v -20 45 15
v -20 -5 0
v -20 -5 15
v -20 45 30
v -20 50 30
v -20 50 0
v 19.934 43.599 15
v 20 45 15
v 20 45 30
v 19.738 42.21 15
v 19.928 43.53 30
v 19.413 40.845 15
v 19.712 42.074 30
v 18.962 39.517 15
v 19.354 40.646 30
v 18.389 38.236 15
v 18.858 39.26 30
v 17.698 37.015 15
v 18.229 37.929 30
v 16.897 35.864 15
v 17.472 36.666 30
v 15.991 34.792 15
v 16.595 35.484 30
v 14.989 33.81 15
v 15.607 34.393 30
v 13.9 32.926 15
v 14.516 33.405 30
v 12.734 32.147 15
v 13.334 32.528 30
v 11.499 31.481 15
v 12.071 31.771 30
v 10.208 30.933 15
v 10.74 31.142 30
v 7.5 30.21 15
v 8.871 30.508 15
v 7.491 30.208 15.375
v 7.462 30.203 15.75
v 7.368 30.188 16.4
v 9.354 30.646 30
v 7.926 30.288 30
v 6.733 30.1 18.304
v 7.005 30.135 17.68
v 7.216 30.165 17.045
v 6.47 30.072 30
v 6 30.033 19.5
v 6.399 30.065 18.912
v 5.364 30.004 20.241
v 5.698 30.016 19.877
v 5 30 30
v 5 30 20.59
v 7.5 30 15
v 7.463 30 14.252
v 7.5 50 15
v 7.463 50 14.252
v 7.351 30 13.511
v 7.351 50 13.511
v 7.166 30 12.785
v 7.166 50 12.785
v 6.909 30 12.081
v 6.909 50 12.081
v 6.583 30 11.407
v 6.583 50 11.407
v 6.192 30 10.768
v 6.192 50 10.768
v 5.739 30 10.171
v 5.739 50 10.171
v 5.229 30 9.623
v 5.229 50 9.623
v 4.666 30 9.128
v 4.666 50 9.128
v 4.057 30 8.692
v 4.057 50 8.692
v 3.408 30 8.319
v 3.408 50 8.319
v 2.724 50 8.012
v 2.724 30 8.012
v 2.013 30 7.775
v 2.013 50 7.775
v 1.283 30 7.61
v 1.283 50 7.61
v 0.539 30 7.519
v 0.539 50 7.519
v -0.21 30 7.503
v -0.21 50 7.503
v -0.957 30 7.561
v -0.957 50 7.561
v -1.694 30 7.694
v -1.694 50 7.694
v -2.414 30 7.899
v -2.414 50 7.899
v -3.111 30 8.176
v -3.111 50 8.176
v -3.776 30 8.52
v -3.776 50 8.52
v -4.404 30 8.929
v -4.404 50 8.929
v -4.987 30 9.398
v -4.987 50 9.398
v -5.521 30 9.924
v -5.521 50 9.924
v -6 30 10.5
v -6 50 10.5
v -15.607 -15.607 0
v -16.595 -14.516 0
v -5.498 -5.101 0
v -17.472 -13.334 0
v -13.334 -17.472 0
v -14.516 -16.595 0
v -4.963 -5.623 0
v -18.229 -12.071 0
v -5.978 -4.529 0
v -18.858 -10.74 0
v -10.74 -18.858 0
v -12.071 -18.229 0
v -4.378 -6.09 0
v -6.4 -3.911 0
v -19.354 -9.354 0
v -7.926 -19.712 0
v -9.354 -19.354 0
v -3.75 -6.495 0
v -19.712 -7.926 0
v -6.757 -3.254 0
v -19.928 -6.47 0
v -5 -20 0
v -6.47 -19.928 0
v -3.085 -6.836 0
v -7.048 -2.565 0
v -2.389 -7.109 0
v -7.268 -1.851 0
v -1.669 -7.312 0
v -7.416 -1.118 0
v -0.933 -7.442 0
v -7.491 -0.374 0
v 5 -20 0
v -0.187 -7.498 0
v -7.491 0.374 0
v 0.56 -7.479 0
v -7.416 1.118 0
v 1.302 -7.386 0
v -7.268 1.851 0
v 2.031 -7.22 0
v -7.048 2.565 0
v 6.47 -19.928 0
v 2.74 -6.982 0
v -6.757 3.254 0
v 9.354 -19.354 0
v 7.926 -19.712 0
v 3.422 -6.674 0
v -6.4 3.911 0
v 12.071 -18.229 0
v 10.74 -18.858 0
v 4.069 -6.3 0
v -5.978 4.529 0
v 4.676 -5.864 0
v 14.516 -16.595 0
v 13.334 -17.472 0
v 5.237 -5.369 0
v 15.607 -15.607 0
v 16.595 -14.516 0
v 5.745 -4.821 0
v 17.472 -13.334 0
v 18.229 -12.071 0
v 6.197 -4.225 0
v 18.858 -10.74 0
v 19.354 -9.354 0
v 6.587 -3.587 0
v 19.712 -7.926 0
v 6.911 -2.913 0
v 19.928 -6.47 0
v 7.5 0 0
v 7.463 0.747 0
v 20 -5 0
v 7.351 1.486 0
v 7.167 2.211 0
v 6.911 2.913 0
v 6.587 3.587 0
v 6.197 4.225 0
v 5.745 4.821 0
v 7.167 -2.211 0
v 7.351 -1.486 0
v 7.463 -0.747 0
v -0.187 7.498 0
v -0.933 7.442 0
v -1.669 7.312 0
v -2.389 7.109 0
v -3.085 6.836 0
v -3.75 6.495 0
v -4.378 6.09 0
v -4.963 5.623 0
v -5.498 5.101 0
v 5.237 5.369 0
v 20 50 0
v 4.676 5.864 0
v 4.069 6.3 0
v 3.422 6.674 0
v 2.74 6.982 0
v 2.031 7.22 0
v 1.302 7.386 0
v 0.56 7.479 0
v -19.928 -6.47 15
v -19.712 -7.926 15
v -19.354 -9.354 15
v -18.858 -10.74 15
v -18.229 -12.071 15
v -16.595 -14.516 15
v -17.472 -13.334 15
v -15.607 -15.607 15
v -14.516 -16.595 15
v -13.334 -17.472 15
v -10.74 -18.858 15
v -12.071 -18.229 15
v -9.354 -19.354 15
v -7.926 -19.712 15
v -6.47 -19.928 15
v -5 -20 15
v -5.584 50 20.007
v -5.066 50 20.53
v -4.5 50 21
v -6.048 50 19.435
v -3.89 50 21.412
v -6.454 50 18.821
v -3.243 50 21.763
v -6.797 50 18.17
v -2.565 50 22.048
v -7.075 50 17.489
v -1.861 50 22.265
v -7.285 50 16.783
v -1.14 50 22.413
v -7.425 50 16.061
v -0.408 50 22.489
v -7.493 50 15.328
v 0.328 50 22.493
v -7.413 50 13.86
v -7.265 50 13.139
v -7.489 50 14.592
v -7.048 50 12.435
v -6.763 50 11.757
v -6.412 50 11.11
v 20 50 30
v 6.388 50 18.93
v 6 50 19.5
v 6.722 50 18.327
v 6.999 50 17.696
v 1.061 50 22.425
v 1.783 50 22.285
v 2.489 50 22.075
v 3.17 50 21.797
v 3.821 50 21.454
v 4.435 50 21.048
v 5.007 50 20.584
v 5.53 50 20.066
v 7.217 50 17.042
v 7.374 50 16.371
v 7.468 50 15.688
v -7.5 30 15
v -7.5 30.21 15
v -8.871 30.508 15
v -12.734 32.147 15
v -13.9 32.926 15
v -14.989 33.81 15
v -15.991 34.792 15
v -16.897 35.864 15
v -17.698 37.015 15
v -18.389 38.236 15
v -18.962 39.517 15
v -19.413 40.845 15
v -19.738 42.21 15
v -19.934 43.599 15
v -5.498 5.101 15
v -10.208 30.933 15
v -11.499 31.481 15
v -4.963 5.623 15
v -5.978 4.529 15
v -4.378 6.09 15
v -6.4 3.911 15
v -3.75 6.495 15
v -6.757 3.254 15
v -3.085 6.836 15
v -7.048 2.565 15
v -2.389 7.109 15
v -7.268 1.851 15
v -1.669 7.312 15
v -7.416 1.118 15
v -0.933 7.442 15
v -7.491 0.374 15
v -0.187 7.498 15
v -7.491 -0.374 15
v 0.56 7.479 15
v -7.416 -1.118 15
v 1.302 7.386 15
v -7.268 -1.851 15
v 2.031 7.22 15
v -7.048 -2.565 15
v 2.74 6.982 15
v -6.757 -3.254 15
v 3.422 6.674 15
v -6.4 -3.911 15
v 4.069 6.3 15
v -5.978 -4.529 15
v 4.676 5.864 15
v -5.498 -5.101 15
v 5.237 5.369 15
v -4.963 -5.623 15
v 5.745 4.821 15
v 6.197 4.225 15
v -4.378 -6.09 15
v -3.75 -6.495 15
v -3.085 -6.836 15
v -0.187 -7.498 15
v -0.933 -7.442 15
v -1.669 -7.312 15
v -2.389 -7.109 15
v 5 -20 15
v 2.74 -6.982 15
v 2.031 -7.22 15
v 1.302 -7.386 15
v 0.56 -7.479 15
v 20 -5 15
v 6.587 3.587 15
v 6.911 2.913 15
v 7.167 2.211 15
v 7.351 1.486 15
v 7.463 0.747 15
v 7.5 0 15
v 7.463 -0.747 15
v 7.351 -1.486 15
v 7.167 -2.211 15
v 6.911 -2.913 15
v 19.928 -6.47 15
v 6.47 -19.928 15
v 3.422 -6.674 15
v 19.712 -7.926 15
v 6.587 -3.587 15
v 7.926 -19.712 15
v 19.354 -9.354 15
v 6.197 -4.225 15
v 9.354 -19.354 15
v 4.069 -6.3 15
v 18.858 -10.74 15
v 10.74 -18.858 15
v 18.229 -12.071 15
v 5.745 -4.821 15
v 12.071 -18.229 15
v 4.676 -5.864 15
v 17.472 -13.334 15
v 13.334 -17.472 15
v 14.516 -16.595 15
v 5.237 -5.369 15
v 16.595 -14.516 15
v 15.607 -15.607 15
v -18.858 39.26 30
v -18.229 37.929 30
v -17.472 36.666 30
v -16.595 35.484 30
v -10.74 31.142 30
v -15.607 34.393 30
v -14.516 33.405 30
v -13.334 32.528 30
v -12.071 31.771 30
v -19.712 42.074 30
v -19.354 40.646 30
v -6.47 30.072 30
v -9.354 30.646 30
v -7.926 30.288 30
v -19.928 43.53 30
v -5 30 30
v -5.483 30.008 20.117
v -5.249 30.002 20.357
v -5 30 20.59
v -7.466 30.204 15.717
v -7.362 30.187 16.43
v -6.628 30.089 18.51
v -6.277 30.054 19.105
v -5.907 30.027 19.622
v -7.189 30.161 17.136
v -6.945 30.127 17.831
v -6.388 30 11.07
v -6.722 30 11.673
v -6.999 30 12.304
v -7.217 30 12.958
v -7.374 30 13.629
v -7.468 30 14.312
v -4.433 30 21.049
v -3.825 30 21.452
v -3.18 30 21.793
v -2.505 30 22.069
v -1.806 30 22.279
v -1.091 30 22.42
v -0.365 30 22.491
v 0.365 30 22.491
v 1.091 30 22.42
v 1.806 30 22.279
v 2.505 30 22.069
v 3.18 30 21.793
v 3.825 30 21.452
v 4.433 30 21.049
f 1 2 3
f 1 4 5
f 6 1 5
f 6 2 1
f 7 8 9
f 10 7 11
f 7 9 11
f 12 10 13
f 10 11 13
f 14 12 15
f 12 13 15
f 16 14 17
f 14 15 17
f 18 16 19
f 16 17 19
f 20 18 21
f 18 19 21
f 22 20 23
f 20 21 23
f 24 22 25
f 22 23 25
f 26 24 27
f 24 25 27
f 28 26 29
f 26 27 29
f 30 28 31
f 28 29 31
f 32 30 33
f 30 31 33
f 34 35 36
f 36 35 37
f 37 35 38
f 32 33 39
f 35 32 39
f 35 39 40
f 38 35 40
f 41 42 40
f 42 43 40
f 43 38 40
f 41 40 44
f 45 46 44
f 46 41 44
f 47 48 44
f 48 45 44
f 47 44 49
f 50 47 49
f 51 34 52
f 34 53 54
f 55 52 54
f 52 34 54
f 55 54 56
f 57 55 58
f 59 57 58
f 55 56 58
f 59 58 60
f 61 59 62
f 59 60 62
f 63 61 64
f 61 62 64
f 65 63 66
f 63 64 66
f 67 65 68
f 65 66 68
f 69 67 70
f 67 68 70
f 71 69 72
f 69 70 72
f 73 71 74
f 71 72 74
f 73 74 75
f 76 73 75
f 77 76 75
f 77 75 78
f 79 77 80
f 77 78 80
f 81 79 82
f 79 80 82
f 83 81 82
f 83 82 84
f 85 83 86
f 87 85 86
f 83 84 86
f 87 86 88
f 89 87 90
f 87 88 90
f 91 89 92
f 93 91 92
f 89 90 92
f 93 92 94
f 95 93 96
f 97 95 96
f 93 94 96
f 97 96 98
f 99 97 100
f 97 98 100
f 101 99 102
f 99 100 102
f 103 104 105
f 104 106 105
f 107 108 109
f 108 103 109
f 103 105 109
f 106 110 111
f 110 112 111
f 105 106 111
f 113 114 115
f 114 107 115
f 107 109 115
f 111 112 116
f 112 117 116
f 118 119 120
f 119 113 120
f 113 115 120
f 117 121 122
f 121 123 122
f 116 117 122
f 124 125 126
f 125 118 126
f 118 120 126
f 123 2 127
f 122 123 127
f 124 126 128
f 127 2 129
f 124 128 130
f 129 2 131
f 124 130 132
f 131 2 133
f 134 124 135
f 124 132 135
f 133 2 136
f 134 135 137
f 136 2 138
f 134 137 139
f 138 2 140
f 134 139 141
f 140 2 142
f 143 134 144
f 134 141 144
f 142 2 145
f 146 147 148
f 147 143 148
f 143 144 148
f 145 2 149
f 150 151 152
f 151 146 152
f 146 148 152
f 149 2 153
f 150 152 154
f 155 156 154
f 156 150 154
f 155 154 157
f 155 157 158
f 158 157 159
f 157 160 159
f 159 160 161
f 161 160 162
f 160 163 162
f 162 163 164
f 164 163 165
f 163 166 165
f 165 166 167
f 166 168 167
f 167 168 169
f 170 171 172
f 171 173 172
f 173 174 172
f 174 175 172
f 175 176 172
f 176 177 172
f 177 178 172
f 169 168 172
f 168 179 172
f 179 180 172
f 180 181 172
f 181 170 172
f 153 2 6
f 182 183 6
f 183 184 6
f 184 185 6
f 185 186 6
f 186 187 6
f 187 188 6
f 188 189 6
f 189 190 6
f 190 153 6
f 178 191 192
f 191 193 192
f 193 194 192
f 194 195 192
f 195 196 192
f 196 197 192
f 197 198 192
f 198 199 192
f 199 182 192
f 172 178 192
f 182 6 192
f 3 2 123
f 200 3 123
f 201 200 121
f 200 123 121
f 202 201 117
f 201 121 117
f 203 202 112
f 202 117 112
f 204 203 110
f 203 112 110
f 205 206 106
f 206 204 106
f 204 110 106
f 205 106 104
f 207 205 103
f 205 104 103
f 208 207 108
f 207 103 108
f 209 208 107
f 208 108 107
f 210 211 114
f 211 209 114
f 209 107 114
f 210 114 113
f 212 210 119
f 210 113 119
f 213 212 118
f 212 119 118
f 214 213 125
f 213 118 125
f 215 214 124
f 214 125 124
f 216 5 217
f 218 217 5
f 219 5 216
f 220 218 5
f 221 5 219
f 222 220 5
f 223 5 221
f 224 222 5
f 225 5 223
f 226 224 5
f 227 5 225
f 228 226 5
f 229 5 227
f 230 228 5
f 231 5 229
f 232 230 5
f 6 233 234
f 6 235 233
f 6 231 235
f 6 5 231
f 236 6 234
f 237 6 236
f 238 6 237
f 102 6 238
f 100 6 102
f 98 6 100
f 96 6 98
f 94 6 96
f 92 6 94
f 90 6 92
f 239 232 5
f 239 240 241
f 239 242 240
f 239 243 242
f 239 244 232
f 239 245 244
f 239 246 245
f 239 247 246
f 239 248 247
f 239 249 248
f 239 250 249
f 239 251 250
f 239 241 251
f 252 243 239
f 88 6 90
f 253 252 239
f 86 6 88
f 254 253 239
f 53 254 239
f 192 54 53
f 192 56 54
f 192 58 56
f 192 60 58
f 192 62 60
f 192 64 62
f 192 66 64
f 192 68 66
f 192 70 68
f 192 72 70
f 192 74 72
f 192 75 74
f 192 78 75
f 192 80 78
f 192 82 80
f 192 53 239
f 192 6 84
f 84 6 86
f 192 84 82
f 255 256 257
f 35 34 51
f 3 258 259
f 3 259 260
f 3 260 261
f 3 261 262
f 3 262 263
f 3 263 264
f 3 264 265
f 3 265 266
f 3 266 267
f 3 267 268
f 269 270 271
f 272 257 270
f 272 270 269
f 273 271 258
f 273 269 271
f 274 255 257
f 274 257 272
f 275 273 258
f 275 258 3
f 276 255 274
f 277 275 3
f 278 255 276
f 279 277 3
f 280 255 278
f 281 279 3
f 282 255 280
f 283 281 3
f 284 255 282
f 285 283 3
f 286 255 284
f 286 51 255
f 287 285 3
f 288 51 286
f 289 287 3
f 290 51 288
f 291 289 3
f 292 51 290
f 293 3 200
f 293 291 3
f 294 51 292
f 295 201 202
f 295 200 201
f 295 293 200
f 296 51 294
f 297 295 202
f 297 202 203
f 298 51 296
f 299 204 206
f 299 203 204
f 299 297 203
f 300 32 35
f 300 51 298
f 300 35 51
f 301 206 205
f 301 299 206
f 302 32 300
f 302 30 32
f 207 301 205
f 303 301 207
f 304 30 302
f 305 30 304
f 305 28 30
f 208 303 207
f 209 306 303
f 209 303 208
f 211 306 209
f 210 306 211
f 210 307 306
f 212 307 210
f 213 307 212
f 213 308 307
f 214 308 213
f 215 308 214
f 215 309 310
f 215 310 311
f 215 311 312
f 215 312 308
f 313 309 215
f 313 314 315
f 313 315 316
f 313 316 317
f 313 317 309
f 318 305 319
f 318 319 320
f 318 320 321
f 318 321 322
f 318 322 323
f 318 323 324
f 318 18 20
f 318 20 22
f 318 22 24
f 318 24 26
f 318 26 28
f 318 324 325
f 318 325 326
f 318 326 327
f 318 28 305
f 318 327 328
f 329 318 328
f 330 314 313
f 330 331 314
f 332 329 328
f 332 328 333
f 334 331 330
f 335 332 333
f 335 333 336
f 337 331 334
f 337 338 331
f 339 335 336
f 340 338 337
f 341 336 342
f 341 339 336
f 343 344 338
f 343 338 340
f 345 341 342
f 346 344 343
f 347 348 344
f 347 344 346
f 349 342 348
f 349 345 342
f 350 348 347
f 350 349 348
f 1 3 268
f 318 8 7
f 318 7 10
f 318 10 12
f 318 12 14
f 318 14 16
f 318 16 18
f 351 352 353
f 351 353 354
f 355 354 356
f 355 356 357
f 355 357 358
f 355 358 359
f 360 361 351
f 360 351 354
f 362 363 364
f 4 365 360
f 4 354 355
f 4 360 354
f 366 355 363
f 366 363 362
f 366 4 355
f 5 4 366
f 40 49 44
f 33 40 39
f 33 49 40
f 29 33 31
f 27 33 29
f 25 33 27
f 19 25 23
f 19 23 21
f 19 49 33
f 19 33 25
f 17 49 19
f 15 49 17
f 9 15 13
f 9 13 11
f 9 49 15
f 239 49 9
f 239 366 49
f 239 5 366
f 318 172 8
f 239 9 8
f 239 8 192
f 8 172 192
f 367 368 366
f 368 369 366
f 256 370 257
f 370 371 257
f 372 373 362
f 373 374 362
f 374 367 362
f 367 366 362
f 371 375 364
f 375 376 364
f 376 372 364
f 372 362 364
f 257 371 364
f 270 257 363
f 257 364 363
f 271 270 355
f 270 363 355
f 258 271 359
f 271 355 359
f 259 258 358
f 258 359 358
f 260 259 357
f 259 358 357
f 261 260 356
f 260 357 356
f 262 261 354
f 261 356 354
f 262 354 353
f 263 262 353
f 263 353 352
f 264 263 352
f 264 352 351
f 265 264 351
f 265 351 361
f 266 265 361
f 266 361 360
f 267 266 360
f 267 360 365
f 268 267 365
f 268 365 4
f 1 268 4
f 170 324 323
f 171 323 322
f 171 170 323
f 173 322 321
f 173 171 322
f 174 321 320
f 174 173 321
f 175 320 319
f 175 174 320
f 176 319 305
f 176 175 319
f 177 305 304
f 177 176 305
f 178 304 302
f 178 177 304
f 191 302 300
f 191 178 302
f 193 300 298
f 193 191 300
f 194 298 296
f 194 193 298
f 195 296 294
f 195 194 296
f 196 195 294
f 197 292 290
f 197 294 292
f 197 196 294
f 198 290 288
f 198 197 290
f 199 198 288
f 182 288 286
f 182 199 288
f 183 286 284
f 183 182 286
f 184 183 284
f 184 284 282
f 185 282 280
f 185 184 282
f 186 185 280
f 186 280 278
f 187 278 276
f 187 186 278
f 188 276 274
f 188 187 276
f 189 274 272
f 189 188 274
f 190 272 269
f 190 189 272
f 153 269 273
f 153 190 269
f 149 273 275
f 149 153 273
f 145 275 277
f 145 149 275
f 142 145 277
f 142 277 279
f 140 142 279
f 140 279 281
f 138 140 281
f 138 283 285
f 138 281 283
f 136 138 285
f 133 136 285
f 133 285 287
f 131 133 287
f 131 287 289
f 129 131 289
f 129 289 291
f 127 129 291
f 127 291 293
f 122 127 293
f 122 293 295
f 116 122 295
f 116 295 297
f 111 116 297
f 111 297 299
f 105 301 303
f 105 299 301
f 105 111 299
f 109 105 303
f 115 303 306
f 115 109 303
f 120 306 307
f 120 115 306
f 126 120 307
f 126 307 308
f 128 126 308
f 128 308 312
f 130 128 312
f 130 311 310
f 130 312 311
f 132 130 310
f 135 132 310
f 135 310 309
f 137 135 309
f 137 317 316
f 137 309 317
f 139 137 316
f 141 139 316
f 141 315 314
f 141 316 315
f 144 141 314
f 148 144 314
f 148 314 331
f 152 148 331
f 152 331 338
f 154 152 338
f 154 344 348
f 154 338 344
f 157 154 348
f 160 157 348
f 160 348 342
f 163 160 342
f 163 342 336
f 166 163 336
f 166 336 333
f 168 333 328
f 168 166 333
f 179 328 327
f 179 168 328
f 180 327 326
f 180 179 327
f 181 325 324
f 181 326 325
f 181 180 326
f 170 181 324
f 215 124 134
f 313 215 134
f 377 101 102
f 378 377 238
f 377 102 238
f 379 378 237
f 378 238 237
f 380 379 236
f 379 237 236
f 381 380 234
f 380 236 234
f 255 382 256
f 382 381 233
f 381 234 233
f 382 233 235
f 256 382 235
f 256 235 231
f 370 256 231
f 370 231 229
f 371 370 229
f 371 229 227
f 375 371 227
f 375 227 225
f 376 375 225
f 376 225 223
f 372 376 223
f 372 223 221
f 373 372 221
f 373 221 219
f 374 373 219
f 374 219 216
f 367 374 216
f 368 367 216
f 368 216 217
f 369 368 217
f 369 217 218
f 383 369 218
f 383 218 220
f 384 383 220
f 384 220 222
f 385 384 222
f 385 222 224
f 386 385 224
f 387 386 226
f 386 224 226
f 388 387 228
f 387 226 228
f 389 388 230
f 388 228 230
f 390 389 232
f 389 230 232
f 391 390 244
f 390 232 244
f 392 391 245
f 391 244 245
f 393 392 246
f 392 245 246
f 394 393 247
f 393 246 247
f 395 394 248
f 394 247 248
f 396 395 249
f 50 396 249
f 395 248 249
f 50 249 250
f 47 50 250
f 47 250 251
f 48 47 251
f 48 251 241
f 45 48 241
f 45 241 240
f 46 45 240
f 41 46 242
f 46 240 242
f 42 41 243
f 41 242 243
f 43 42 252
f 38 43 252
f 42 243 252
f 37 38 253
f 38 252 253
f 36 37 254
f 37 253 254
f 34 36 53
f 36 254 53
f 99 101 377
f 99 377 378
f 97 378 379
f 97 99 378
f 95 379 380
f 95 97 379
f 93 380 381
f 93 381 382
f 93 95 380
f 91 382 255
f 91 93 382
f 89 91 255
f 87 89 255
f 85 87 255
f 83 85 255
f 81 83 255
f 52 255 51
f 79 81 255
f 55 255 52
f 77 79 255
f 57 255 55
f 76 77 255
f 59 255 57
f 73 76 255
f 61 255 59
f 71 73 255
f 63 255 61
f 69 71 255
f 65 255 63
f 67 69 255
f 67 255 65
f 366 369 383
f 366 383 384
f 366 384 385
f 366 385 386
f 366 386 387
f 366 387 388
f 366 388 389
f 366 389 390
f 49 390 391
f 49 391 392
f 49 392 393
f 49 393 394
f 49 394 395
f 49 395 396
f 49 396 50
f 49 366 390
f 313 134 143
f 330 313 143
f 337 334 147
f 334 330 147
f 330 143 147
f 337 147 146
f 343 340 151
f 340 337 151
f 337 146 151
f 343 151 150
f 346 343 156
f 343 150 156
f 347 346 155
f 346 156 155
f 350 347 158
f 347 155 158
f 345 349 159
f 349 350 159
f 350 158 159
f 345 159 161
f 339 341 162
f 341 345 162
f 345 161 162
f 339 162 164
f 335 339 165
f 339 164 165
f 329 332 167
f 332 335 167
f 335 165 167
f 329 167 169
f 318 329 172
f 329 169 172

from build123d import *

# Parameters (mm, degrees)
SKETCH1_W           = 40
SKETCH1_H           = 70
SKETCH1_R           = 7.5
BOSS_EXTRUDE1_DEPTH = 30
CUT_EXTRUDE1_DEPTH  = 20
SKETCH3_W           = 40
SKETCH3_H           = 50
CUT_EXTRUDE2_DEPTH  = 15
FILLET1_R           = 15


with BuildPart() as part:
    # Sketch1 → Boss-Extrude1 (new body)
    with BuildSketch(Plane.XY):
        with Locations((0, 15)):
            Rectangle(SKETCH1_W, SKETCH1_H)
        Circle(SKETCH1_R, mode=Mode.SUBTRACT)
    extrude(amount=BOSS_EXTRUDE1_DEPTH)

    # Sketch2 → Cut-Extrude1 (cut)
    with BuildSketch(Plane(origin=(0, 50, 0), x_dir=(1, 0, 0), z_dir=(0, 1, 0))):
        with BuildLine():
            ThreePointArc((7.5, -15), (2.371708245, -7.884875265), (-6, -10.5))
            Line((-6, -10.5), (6, -19.5))
            ThreePointArc((6, -19.5), (7.115124735, -17.371708245), (7.5, -15))
        make_face()
        with BuildLine():
            Line((6, -19.5), (-6, -10.5))
            ThreePointArc((-6, -10.5), (-4.5, -21), (6, -19.5))
        make_face()
    extrude(amount=-CUT_EXTRUDE1_DEPTH, mode=Mode.SUBTRACT)

    # Sketch3 → Cut-Extrude2 (cut)
    with BuildSketch(Plane.XY.offset(30)):
        with Locations((0, 5)):
            Rectangle(SKETCH3_W, SKETCH3_H)
    extrude(amount=-CUT_EXTRUDE2_DEPTH, mode=Mode.SUBTRACT)

    # Fillet1
    # the kernel refuses this fillet: 15 mm, written as the material it takes off along each edge
    with BuildSketch(Plane(origin=(20, -20, -37.5), x_dir=(0, 1, 0), z_dir=(0, 0, 1))) as fillet1_piece_1:
        with BuildLine():
            CenterArc((FILLET1_R, FILLET1_R), FILLET1_R, 180, 90)
            Line((0, FILLET1_R), (0, 0))
            Line((0, 0), (FILLET1_R, 0))
        make_face()
    extrude(amount=90, mode=Mode.SUBTRACT)
    with BuildSketch(Plane(origin=(-20, -20, -37.5), x_dir=(0, 1, 0), z_dir=(0, 0, 1))) as fillet1_piece_2:
        with BuildLine():
            CenterArc((FILLET1_R, -FILLET1_R), FILLET1_R, 90, 90)
            Line((0, -FILLET1_R), (0, 0))
            Line((0, 0), (FILLET1_R, 0))
        make_face()
    extrude(amount=90, mode=Mode.SUBTRACT)
    with BuildSketch(Plane(origin=(-20, 30, 67.5), x_dir=(0, 1, 0), z_dir=(0, 0, -1))) as fillet1_piece_3:
        with BuildLine():
            CenterArc((FILLET1_R, FILLET1_R), FILLET1_R, 180, 90)
            Line((0, FILLET1_R), (0, 0))
            Line((0, 0), (FILLET1_R, 0))
        make_face()
    extrude(amount=52.5, mode=Mode.SUBTRACT)
    with BuildSketch(Plane(origin=(20, 30, 67.5), x_dir=(0, 1, 0), z_dir=(0, 0, -1))) as fillet1_piece_4:
        with BuildLine():
            CenterArc((FILLET1_R, -FILLET1_R), FILLET1_R, 90, 90)
            Line((0, -FILLET1_R), (0, 0))
            Line((0, 0), (FILLET1_R, 0))
        make_face()
    extrude(amount=52.5, mode=Mode.SUBTRACT)


solid = part.part
